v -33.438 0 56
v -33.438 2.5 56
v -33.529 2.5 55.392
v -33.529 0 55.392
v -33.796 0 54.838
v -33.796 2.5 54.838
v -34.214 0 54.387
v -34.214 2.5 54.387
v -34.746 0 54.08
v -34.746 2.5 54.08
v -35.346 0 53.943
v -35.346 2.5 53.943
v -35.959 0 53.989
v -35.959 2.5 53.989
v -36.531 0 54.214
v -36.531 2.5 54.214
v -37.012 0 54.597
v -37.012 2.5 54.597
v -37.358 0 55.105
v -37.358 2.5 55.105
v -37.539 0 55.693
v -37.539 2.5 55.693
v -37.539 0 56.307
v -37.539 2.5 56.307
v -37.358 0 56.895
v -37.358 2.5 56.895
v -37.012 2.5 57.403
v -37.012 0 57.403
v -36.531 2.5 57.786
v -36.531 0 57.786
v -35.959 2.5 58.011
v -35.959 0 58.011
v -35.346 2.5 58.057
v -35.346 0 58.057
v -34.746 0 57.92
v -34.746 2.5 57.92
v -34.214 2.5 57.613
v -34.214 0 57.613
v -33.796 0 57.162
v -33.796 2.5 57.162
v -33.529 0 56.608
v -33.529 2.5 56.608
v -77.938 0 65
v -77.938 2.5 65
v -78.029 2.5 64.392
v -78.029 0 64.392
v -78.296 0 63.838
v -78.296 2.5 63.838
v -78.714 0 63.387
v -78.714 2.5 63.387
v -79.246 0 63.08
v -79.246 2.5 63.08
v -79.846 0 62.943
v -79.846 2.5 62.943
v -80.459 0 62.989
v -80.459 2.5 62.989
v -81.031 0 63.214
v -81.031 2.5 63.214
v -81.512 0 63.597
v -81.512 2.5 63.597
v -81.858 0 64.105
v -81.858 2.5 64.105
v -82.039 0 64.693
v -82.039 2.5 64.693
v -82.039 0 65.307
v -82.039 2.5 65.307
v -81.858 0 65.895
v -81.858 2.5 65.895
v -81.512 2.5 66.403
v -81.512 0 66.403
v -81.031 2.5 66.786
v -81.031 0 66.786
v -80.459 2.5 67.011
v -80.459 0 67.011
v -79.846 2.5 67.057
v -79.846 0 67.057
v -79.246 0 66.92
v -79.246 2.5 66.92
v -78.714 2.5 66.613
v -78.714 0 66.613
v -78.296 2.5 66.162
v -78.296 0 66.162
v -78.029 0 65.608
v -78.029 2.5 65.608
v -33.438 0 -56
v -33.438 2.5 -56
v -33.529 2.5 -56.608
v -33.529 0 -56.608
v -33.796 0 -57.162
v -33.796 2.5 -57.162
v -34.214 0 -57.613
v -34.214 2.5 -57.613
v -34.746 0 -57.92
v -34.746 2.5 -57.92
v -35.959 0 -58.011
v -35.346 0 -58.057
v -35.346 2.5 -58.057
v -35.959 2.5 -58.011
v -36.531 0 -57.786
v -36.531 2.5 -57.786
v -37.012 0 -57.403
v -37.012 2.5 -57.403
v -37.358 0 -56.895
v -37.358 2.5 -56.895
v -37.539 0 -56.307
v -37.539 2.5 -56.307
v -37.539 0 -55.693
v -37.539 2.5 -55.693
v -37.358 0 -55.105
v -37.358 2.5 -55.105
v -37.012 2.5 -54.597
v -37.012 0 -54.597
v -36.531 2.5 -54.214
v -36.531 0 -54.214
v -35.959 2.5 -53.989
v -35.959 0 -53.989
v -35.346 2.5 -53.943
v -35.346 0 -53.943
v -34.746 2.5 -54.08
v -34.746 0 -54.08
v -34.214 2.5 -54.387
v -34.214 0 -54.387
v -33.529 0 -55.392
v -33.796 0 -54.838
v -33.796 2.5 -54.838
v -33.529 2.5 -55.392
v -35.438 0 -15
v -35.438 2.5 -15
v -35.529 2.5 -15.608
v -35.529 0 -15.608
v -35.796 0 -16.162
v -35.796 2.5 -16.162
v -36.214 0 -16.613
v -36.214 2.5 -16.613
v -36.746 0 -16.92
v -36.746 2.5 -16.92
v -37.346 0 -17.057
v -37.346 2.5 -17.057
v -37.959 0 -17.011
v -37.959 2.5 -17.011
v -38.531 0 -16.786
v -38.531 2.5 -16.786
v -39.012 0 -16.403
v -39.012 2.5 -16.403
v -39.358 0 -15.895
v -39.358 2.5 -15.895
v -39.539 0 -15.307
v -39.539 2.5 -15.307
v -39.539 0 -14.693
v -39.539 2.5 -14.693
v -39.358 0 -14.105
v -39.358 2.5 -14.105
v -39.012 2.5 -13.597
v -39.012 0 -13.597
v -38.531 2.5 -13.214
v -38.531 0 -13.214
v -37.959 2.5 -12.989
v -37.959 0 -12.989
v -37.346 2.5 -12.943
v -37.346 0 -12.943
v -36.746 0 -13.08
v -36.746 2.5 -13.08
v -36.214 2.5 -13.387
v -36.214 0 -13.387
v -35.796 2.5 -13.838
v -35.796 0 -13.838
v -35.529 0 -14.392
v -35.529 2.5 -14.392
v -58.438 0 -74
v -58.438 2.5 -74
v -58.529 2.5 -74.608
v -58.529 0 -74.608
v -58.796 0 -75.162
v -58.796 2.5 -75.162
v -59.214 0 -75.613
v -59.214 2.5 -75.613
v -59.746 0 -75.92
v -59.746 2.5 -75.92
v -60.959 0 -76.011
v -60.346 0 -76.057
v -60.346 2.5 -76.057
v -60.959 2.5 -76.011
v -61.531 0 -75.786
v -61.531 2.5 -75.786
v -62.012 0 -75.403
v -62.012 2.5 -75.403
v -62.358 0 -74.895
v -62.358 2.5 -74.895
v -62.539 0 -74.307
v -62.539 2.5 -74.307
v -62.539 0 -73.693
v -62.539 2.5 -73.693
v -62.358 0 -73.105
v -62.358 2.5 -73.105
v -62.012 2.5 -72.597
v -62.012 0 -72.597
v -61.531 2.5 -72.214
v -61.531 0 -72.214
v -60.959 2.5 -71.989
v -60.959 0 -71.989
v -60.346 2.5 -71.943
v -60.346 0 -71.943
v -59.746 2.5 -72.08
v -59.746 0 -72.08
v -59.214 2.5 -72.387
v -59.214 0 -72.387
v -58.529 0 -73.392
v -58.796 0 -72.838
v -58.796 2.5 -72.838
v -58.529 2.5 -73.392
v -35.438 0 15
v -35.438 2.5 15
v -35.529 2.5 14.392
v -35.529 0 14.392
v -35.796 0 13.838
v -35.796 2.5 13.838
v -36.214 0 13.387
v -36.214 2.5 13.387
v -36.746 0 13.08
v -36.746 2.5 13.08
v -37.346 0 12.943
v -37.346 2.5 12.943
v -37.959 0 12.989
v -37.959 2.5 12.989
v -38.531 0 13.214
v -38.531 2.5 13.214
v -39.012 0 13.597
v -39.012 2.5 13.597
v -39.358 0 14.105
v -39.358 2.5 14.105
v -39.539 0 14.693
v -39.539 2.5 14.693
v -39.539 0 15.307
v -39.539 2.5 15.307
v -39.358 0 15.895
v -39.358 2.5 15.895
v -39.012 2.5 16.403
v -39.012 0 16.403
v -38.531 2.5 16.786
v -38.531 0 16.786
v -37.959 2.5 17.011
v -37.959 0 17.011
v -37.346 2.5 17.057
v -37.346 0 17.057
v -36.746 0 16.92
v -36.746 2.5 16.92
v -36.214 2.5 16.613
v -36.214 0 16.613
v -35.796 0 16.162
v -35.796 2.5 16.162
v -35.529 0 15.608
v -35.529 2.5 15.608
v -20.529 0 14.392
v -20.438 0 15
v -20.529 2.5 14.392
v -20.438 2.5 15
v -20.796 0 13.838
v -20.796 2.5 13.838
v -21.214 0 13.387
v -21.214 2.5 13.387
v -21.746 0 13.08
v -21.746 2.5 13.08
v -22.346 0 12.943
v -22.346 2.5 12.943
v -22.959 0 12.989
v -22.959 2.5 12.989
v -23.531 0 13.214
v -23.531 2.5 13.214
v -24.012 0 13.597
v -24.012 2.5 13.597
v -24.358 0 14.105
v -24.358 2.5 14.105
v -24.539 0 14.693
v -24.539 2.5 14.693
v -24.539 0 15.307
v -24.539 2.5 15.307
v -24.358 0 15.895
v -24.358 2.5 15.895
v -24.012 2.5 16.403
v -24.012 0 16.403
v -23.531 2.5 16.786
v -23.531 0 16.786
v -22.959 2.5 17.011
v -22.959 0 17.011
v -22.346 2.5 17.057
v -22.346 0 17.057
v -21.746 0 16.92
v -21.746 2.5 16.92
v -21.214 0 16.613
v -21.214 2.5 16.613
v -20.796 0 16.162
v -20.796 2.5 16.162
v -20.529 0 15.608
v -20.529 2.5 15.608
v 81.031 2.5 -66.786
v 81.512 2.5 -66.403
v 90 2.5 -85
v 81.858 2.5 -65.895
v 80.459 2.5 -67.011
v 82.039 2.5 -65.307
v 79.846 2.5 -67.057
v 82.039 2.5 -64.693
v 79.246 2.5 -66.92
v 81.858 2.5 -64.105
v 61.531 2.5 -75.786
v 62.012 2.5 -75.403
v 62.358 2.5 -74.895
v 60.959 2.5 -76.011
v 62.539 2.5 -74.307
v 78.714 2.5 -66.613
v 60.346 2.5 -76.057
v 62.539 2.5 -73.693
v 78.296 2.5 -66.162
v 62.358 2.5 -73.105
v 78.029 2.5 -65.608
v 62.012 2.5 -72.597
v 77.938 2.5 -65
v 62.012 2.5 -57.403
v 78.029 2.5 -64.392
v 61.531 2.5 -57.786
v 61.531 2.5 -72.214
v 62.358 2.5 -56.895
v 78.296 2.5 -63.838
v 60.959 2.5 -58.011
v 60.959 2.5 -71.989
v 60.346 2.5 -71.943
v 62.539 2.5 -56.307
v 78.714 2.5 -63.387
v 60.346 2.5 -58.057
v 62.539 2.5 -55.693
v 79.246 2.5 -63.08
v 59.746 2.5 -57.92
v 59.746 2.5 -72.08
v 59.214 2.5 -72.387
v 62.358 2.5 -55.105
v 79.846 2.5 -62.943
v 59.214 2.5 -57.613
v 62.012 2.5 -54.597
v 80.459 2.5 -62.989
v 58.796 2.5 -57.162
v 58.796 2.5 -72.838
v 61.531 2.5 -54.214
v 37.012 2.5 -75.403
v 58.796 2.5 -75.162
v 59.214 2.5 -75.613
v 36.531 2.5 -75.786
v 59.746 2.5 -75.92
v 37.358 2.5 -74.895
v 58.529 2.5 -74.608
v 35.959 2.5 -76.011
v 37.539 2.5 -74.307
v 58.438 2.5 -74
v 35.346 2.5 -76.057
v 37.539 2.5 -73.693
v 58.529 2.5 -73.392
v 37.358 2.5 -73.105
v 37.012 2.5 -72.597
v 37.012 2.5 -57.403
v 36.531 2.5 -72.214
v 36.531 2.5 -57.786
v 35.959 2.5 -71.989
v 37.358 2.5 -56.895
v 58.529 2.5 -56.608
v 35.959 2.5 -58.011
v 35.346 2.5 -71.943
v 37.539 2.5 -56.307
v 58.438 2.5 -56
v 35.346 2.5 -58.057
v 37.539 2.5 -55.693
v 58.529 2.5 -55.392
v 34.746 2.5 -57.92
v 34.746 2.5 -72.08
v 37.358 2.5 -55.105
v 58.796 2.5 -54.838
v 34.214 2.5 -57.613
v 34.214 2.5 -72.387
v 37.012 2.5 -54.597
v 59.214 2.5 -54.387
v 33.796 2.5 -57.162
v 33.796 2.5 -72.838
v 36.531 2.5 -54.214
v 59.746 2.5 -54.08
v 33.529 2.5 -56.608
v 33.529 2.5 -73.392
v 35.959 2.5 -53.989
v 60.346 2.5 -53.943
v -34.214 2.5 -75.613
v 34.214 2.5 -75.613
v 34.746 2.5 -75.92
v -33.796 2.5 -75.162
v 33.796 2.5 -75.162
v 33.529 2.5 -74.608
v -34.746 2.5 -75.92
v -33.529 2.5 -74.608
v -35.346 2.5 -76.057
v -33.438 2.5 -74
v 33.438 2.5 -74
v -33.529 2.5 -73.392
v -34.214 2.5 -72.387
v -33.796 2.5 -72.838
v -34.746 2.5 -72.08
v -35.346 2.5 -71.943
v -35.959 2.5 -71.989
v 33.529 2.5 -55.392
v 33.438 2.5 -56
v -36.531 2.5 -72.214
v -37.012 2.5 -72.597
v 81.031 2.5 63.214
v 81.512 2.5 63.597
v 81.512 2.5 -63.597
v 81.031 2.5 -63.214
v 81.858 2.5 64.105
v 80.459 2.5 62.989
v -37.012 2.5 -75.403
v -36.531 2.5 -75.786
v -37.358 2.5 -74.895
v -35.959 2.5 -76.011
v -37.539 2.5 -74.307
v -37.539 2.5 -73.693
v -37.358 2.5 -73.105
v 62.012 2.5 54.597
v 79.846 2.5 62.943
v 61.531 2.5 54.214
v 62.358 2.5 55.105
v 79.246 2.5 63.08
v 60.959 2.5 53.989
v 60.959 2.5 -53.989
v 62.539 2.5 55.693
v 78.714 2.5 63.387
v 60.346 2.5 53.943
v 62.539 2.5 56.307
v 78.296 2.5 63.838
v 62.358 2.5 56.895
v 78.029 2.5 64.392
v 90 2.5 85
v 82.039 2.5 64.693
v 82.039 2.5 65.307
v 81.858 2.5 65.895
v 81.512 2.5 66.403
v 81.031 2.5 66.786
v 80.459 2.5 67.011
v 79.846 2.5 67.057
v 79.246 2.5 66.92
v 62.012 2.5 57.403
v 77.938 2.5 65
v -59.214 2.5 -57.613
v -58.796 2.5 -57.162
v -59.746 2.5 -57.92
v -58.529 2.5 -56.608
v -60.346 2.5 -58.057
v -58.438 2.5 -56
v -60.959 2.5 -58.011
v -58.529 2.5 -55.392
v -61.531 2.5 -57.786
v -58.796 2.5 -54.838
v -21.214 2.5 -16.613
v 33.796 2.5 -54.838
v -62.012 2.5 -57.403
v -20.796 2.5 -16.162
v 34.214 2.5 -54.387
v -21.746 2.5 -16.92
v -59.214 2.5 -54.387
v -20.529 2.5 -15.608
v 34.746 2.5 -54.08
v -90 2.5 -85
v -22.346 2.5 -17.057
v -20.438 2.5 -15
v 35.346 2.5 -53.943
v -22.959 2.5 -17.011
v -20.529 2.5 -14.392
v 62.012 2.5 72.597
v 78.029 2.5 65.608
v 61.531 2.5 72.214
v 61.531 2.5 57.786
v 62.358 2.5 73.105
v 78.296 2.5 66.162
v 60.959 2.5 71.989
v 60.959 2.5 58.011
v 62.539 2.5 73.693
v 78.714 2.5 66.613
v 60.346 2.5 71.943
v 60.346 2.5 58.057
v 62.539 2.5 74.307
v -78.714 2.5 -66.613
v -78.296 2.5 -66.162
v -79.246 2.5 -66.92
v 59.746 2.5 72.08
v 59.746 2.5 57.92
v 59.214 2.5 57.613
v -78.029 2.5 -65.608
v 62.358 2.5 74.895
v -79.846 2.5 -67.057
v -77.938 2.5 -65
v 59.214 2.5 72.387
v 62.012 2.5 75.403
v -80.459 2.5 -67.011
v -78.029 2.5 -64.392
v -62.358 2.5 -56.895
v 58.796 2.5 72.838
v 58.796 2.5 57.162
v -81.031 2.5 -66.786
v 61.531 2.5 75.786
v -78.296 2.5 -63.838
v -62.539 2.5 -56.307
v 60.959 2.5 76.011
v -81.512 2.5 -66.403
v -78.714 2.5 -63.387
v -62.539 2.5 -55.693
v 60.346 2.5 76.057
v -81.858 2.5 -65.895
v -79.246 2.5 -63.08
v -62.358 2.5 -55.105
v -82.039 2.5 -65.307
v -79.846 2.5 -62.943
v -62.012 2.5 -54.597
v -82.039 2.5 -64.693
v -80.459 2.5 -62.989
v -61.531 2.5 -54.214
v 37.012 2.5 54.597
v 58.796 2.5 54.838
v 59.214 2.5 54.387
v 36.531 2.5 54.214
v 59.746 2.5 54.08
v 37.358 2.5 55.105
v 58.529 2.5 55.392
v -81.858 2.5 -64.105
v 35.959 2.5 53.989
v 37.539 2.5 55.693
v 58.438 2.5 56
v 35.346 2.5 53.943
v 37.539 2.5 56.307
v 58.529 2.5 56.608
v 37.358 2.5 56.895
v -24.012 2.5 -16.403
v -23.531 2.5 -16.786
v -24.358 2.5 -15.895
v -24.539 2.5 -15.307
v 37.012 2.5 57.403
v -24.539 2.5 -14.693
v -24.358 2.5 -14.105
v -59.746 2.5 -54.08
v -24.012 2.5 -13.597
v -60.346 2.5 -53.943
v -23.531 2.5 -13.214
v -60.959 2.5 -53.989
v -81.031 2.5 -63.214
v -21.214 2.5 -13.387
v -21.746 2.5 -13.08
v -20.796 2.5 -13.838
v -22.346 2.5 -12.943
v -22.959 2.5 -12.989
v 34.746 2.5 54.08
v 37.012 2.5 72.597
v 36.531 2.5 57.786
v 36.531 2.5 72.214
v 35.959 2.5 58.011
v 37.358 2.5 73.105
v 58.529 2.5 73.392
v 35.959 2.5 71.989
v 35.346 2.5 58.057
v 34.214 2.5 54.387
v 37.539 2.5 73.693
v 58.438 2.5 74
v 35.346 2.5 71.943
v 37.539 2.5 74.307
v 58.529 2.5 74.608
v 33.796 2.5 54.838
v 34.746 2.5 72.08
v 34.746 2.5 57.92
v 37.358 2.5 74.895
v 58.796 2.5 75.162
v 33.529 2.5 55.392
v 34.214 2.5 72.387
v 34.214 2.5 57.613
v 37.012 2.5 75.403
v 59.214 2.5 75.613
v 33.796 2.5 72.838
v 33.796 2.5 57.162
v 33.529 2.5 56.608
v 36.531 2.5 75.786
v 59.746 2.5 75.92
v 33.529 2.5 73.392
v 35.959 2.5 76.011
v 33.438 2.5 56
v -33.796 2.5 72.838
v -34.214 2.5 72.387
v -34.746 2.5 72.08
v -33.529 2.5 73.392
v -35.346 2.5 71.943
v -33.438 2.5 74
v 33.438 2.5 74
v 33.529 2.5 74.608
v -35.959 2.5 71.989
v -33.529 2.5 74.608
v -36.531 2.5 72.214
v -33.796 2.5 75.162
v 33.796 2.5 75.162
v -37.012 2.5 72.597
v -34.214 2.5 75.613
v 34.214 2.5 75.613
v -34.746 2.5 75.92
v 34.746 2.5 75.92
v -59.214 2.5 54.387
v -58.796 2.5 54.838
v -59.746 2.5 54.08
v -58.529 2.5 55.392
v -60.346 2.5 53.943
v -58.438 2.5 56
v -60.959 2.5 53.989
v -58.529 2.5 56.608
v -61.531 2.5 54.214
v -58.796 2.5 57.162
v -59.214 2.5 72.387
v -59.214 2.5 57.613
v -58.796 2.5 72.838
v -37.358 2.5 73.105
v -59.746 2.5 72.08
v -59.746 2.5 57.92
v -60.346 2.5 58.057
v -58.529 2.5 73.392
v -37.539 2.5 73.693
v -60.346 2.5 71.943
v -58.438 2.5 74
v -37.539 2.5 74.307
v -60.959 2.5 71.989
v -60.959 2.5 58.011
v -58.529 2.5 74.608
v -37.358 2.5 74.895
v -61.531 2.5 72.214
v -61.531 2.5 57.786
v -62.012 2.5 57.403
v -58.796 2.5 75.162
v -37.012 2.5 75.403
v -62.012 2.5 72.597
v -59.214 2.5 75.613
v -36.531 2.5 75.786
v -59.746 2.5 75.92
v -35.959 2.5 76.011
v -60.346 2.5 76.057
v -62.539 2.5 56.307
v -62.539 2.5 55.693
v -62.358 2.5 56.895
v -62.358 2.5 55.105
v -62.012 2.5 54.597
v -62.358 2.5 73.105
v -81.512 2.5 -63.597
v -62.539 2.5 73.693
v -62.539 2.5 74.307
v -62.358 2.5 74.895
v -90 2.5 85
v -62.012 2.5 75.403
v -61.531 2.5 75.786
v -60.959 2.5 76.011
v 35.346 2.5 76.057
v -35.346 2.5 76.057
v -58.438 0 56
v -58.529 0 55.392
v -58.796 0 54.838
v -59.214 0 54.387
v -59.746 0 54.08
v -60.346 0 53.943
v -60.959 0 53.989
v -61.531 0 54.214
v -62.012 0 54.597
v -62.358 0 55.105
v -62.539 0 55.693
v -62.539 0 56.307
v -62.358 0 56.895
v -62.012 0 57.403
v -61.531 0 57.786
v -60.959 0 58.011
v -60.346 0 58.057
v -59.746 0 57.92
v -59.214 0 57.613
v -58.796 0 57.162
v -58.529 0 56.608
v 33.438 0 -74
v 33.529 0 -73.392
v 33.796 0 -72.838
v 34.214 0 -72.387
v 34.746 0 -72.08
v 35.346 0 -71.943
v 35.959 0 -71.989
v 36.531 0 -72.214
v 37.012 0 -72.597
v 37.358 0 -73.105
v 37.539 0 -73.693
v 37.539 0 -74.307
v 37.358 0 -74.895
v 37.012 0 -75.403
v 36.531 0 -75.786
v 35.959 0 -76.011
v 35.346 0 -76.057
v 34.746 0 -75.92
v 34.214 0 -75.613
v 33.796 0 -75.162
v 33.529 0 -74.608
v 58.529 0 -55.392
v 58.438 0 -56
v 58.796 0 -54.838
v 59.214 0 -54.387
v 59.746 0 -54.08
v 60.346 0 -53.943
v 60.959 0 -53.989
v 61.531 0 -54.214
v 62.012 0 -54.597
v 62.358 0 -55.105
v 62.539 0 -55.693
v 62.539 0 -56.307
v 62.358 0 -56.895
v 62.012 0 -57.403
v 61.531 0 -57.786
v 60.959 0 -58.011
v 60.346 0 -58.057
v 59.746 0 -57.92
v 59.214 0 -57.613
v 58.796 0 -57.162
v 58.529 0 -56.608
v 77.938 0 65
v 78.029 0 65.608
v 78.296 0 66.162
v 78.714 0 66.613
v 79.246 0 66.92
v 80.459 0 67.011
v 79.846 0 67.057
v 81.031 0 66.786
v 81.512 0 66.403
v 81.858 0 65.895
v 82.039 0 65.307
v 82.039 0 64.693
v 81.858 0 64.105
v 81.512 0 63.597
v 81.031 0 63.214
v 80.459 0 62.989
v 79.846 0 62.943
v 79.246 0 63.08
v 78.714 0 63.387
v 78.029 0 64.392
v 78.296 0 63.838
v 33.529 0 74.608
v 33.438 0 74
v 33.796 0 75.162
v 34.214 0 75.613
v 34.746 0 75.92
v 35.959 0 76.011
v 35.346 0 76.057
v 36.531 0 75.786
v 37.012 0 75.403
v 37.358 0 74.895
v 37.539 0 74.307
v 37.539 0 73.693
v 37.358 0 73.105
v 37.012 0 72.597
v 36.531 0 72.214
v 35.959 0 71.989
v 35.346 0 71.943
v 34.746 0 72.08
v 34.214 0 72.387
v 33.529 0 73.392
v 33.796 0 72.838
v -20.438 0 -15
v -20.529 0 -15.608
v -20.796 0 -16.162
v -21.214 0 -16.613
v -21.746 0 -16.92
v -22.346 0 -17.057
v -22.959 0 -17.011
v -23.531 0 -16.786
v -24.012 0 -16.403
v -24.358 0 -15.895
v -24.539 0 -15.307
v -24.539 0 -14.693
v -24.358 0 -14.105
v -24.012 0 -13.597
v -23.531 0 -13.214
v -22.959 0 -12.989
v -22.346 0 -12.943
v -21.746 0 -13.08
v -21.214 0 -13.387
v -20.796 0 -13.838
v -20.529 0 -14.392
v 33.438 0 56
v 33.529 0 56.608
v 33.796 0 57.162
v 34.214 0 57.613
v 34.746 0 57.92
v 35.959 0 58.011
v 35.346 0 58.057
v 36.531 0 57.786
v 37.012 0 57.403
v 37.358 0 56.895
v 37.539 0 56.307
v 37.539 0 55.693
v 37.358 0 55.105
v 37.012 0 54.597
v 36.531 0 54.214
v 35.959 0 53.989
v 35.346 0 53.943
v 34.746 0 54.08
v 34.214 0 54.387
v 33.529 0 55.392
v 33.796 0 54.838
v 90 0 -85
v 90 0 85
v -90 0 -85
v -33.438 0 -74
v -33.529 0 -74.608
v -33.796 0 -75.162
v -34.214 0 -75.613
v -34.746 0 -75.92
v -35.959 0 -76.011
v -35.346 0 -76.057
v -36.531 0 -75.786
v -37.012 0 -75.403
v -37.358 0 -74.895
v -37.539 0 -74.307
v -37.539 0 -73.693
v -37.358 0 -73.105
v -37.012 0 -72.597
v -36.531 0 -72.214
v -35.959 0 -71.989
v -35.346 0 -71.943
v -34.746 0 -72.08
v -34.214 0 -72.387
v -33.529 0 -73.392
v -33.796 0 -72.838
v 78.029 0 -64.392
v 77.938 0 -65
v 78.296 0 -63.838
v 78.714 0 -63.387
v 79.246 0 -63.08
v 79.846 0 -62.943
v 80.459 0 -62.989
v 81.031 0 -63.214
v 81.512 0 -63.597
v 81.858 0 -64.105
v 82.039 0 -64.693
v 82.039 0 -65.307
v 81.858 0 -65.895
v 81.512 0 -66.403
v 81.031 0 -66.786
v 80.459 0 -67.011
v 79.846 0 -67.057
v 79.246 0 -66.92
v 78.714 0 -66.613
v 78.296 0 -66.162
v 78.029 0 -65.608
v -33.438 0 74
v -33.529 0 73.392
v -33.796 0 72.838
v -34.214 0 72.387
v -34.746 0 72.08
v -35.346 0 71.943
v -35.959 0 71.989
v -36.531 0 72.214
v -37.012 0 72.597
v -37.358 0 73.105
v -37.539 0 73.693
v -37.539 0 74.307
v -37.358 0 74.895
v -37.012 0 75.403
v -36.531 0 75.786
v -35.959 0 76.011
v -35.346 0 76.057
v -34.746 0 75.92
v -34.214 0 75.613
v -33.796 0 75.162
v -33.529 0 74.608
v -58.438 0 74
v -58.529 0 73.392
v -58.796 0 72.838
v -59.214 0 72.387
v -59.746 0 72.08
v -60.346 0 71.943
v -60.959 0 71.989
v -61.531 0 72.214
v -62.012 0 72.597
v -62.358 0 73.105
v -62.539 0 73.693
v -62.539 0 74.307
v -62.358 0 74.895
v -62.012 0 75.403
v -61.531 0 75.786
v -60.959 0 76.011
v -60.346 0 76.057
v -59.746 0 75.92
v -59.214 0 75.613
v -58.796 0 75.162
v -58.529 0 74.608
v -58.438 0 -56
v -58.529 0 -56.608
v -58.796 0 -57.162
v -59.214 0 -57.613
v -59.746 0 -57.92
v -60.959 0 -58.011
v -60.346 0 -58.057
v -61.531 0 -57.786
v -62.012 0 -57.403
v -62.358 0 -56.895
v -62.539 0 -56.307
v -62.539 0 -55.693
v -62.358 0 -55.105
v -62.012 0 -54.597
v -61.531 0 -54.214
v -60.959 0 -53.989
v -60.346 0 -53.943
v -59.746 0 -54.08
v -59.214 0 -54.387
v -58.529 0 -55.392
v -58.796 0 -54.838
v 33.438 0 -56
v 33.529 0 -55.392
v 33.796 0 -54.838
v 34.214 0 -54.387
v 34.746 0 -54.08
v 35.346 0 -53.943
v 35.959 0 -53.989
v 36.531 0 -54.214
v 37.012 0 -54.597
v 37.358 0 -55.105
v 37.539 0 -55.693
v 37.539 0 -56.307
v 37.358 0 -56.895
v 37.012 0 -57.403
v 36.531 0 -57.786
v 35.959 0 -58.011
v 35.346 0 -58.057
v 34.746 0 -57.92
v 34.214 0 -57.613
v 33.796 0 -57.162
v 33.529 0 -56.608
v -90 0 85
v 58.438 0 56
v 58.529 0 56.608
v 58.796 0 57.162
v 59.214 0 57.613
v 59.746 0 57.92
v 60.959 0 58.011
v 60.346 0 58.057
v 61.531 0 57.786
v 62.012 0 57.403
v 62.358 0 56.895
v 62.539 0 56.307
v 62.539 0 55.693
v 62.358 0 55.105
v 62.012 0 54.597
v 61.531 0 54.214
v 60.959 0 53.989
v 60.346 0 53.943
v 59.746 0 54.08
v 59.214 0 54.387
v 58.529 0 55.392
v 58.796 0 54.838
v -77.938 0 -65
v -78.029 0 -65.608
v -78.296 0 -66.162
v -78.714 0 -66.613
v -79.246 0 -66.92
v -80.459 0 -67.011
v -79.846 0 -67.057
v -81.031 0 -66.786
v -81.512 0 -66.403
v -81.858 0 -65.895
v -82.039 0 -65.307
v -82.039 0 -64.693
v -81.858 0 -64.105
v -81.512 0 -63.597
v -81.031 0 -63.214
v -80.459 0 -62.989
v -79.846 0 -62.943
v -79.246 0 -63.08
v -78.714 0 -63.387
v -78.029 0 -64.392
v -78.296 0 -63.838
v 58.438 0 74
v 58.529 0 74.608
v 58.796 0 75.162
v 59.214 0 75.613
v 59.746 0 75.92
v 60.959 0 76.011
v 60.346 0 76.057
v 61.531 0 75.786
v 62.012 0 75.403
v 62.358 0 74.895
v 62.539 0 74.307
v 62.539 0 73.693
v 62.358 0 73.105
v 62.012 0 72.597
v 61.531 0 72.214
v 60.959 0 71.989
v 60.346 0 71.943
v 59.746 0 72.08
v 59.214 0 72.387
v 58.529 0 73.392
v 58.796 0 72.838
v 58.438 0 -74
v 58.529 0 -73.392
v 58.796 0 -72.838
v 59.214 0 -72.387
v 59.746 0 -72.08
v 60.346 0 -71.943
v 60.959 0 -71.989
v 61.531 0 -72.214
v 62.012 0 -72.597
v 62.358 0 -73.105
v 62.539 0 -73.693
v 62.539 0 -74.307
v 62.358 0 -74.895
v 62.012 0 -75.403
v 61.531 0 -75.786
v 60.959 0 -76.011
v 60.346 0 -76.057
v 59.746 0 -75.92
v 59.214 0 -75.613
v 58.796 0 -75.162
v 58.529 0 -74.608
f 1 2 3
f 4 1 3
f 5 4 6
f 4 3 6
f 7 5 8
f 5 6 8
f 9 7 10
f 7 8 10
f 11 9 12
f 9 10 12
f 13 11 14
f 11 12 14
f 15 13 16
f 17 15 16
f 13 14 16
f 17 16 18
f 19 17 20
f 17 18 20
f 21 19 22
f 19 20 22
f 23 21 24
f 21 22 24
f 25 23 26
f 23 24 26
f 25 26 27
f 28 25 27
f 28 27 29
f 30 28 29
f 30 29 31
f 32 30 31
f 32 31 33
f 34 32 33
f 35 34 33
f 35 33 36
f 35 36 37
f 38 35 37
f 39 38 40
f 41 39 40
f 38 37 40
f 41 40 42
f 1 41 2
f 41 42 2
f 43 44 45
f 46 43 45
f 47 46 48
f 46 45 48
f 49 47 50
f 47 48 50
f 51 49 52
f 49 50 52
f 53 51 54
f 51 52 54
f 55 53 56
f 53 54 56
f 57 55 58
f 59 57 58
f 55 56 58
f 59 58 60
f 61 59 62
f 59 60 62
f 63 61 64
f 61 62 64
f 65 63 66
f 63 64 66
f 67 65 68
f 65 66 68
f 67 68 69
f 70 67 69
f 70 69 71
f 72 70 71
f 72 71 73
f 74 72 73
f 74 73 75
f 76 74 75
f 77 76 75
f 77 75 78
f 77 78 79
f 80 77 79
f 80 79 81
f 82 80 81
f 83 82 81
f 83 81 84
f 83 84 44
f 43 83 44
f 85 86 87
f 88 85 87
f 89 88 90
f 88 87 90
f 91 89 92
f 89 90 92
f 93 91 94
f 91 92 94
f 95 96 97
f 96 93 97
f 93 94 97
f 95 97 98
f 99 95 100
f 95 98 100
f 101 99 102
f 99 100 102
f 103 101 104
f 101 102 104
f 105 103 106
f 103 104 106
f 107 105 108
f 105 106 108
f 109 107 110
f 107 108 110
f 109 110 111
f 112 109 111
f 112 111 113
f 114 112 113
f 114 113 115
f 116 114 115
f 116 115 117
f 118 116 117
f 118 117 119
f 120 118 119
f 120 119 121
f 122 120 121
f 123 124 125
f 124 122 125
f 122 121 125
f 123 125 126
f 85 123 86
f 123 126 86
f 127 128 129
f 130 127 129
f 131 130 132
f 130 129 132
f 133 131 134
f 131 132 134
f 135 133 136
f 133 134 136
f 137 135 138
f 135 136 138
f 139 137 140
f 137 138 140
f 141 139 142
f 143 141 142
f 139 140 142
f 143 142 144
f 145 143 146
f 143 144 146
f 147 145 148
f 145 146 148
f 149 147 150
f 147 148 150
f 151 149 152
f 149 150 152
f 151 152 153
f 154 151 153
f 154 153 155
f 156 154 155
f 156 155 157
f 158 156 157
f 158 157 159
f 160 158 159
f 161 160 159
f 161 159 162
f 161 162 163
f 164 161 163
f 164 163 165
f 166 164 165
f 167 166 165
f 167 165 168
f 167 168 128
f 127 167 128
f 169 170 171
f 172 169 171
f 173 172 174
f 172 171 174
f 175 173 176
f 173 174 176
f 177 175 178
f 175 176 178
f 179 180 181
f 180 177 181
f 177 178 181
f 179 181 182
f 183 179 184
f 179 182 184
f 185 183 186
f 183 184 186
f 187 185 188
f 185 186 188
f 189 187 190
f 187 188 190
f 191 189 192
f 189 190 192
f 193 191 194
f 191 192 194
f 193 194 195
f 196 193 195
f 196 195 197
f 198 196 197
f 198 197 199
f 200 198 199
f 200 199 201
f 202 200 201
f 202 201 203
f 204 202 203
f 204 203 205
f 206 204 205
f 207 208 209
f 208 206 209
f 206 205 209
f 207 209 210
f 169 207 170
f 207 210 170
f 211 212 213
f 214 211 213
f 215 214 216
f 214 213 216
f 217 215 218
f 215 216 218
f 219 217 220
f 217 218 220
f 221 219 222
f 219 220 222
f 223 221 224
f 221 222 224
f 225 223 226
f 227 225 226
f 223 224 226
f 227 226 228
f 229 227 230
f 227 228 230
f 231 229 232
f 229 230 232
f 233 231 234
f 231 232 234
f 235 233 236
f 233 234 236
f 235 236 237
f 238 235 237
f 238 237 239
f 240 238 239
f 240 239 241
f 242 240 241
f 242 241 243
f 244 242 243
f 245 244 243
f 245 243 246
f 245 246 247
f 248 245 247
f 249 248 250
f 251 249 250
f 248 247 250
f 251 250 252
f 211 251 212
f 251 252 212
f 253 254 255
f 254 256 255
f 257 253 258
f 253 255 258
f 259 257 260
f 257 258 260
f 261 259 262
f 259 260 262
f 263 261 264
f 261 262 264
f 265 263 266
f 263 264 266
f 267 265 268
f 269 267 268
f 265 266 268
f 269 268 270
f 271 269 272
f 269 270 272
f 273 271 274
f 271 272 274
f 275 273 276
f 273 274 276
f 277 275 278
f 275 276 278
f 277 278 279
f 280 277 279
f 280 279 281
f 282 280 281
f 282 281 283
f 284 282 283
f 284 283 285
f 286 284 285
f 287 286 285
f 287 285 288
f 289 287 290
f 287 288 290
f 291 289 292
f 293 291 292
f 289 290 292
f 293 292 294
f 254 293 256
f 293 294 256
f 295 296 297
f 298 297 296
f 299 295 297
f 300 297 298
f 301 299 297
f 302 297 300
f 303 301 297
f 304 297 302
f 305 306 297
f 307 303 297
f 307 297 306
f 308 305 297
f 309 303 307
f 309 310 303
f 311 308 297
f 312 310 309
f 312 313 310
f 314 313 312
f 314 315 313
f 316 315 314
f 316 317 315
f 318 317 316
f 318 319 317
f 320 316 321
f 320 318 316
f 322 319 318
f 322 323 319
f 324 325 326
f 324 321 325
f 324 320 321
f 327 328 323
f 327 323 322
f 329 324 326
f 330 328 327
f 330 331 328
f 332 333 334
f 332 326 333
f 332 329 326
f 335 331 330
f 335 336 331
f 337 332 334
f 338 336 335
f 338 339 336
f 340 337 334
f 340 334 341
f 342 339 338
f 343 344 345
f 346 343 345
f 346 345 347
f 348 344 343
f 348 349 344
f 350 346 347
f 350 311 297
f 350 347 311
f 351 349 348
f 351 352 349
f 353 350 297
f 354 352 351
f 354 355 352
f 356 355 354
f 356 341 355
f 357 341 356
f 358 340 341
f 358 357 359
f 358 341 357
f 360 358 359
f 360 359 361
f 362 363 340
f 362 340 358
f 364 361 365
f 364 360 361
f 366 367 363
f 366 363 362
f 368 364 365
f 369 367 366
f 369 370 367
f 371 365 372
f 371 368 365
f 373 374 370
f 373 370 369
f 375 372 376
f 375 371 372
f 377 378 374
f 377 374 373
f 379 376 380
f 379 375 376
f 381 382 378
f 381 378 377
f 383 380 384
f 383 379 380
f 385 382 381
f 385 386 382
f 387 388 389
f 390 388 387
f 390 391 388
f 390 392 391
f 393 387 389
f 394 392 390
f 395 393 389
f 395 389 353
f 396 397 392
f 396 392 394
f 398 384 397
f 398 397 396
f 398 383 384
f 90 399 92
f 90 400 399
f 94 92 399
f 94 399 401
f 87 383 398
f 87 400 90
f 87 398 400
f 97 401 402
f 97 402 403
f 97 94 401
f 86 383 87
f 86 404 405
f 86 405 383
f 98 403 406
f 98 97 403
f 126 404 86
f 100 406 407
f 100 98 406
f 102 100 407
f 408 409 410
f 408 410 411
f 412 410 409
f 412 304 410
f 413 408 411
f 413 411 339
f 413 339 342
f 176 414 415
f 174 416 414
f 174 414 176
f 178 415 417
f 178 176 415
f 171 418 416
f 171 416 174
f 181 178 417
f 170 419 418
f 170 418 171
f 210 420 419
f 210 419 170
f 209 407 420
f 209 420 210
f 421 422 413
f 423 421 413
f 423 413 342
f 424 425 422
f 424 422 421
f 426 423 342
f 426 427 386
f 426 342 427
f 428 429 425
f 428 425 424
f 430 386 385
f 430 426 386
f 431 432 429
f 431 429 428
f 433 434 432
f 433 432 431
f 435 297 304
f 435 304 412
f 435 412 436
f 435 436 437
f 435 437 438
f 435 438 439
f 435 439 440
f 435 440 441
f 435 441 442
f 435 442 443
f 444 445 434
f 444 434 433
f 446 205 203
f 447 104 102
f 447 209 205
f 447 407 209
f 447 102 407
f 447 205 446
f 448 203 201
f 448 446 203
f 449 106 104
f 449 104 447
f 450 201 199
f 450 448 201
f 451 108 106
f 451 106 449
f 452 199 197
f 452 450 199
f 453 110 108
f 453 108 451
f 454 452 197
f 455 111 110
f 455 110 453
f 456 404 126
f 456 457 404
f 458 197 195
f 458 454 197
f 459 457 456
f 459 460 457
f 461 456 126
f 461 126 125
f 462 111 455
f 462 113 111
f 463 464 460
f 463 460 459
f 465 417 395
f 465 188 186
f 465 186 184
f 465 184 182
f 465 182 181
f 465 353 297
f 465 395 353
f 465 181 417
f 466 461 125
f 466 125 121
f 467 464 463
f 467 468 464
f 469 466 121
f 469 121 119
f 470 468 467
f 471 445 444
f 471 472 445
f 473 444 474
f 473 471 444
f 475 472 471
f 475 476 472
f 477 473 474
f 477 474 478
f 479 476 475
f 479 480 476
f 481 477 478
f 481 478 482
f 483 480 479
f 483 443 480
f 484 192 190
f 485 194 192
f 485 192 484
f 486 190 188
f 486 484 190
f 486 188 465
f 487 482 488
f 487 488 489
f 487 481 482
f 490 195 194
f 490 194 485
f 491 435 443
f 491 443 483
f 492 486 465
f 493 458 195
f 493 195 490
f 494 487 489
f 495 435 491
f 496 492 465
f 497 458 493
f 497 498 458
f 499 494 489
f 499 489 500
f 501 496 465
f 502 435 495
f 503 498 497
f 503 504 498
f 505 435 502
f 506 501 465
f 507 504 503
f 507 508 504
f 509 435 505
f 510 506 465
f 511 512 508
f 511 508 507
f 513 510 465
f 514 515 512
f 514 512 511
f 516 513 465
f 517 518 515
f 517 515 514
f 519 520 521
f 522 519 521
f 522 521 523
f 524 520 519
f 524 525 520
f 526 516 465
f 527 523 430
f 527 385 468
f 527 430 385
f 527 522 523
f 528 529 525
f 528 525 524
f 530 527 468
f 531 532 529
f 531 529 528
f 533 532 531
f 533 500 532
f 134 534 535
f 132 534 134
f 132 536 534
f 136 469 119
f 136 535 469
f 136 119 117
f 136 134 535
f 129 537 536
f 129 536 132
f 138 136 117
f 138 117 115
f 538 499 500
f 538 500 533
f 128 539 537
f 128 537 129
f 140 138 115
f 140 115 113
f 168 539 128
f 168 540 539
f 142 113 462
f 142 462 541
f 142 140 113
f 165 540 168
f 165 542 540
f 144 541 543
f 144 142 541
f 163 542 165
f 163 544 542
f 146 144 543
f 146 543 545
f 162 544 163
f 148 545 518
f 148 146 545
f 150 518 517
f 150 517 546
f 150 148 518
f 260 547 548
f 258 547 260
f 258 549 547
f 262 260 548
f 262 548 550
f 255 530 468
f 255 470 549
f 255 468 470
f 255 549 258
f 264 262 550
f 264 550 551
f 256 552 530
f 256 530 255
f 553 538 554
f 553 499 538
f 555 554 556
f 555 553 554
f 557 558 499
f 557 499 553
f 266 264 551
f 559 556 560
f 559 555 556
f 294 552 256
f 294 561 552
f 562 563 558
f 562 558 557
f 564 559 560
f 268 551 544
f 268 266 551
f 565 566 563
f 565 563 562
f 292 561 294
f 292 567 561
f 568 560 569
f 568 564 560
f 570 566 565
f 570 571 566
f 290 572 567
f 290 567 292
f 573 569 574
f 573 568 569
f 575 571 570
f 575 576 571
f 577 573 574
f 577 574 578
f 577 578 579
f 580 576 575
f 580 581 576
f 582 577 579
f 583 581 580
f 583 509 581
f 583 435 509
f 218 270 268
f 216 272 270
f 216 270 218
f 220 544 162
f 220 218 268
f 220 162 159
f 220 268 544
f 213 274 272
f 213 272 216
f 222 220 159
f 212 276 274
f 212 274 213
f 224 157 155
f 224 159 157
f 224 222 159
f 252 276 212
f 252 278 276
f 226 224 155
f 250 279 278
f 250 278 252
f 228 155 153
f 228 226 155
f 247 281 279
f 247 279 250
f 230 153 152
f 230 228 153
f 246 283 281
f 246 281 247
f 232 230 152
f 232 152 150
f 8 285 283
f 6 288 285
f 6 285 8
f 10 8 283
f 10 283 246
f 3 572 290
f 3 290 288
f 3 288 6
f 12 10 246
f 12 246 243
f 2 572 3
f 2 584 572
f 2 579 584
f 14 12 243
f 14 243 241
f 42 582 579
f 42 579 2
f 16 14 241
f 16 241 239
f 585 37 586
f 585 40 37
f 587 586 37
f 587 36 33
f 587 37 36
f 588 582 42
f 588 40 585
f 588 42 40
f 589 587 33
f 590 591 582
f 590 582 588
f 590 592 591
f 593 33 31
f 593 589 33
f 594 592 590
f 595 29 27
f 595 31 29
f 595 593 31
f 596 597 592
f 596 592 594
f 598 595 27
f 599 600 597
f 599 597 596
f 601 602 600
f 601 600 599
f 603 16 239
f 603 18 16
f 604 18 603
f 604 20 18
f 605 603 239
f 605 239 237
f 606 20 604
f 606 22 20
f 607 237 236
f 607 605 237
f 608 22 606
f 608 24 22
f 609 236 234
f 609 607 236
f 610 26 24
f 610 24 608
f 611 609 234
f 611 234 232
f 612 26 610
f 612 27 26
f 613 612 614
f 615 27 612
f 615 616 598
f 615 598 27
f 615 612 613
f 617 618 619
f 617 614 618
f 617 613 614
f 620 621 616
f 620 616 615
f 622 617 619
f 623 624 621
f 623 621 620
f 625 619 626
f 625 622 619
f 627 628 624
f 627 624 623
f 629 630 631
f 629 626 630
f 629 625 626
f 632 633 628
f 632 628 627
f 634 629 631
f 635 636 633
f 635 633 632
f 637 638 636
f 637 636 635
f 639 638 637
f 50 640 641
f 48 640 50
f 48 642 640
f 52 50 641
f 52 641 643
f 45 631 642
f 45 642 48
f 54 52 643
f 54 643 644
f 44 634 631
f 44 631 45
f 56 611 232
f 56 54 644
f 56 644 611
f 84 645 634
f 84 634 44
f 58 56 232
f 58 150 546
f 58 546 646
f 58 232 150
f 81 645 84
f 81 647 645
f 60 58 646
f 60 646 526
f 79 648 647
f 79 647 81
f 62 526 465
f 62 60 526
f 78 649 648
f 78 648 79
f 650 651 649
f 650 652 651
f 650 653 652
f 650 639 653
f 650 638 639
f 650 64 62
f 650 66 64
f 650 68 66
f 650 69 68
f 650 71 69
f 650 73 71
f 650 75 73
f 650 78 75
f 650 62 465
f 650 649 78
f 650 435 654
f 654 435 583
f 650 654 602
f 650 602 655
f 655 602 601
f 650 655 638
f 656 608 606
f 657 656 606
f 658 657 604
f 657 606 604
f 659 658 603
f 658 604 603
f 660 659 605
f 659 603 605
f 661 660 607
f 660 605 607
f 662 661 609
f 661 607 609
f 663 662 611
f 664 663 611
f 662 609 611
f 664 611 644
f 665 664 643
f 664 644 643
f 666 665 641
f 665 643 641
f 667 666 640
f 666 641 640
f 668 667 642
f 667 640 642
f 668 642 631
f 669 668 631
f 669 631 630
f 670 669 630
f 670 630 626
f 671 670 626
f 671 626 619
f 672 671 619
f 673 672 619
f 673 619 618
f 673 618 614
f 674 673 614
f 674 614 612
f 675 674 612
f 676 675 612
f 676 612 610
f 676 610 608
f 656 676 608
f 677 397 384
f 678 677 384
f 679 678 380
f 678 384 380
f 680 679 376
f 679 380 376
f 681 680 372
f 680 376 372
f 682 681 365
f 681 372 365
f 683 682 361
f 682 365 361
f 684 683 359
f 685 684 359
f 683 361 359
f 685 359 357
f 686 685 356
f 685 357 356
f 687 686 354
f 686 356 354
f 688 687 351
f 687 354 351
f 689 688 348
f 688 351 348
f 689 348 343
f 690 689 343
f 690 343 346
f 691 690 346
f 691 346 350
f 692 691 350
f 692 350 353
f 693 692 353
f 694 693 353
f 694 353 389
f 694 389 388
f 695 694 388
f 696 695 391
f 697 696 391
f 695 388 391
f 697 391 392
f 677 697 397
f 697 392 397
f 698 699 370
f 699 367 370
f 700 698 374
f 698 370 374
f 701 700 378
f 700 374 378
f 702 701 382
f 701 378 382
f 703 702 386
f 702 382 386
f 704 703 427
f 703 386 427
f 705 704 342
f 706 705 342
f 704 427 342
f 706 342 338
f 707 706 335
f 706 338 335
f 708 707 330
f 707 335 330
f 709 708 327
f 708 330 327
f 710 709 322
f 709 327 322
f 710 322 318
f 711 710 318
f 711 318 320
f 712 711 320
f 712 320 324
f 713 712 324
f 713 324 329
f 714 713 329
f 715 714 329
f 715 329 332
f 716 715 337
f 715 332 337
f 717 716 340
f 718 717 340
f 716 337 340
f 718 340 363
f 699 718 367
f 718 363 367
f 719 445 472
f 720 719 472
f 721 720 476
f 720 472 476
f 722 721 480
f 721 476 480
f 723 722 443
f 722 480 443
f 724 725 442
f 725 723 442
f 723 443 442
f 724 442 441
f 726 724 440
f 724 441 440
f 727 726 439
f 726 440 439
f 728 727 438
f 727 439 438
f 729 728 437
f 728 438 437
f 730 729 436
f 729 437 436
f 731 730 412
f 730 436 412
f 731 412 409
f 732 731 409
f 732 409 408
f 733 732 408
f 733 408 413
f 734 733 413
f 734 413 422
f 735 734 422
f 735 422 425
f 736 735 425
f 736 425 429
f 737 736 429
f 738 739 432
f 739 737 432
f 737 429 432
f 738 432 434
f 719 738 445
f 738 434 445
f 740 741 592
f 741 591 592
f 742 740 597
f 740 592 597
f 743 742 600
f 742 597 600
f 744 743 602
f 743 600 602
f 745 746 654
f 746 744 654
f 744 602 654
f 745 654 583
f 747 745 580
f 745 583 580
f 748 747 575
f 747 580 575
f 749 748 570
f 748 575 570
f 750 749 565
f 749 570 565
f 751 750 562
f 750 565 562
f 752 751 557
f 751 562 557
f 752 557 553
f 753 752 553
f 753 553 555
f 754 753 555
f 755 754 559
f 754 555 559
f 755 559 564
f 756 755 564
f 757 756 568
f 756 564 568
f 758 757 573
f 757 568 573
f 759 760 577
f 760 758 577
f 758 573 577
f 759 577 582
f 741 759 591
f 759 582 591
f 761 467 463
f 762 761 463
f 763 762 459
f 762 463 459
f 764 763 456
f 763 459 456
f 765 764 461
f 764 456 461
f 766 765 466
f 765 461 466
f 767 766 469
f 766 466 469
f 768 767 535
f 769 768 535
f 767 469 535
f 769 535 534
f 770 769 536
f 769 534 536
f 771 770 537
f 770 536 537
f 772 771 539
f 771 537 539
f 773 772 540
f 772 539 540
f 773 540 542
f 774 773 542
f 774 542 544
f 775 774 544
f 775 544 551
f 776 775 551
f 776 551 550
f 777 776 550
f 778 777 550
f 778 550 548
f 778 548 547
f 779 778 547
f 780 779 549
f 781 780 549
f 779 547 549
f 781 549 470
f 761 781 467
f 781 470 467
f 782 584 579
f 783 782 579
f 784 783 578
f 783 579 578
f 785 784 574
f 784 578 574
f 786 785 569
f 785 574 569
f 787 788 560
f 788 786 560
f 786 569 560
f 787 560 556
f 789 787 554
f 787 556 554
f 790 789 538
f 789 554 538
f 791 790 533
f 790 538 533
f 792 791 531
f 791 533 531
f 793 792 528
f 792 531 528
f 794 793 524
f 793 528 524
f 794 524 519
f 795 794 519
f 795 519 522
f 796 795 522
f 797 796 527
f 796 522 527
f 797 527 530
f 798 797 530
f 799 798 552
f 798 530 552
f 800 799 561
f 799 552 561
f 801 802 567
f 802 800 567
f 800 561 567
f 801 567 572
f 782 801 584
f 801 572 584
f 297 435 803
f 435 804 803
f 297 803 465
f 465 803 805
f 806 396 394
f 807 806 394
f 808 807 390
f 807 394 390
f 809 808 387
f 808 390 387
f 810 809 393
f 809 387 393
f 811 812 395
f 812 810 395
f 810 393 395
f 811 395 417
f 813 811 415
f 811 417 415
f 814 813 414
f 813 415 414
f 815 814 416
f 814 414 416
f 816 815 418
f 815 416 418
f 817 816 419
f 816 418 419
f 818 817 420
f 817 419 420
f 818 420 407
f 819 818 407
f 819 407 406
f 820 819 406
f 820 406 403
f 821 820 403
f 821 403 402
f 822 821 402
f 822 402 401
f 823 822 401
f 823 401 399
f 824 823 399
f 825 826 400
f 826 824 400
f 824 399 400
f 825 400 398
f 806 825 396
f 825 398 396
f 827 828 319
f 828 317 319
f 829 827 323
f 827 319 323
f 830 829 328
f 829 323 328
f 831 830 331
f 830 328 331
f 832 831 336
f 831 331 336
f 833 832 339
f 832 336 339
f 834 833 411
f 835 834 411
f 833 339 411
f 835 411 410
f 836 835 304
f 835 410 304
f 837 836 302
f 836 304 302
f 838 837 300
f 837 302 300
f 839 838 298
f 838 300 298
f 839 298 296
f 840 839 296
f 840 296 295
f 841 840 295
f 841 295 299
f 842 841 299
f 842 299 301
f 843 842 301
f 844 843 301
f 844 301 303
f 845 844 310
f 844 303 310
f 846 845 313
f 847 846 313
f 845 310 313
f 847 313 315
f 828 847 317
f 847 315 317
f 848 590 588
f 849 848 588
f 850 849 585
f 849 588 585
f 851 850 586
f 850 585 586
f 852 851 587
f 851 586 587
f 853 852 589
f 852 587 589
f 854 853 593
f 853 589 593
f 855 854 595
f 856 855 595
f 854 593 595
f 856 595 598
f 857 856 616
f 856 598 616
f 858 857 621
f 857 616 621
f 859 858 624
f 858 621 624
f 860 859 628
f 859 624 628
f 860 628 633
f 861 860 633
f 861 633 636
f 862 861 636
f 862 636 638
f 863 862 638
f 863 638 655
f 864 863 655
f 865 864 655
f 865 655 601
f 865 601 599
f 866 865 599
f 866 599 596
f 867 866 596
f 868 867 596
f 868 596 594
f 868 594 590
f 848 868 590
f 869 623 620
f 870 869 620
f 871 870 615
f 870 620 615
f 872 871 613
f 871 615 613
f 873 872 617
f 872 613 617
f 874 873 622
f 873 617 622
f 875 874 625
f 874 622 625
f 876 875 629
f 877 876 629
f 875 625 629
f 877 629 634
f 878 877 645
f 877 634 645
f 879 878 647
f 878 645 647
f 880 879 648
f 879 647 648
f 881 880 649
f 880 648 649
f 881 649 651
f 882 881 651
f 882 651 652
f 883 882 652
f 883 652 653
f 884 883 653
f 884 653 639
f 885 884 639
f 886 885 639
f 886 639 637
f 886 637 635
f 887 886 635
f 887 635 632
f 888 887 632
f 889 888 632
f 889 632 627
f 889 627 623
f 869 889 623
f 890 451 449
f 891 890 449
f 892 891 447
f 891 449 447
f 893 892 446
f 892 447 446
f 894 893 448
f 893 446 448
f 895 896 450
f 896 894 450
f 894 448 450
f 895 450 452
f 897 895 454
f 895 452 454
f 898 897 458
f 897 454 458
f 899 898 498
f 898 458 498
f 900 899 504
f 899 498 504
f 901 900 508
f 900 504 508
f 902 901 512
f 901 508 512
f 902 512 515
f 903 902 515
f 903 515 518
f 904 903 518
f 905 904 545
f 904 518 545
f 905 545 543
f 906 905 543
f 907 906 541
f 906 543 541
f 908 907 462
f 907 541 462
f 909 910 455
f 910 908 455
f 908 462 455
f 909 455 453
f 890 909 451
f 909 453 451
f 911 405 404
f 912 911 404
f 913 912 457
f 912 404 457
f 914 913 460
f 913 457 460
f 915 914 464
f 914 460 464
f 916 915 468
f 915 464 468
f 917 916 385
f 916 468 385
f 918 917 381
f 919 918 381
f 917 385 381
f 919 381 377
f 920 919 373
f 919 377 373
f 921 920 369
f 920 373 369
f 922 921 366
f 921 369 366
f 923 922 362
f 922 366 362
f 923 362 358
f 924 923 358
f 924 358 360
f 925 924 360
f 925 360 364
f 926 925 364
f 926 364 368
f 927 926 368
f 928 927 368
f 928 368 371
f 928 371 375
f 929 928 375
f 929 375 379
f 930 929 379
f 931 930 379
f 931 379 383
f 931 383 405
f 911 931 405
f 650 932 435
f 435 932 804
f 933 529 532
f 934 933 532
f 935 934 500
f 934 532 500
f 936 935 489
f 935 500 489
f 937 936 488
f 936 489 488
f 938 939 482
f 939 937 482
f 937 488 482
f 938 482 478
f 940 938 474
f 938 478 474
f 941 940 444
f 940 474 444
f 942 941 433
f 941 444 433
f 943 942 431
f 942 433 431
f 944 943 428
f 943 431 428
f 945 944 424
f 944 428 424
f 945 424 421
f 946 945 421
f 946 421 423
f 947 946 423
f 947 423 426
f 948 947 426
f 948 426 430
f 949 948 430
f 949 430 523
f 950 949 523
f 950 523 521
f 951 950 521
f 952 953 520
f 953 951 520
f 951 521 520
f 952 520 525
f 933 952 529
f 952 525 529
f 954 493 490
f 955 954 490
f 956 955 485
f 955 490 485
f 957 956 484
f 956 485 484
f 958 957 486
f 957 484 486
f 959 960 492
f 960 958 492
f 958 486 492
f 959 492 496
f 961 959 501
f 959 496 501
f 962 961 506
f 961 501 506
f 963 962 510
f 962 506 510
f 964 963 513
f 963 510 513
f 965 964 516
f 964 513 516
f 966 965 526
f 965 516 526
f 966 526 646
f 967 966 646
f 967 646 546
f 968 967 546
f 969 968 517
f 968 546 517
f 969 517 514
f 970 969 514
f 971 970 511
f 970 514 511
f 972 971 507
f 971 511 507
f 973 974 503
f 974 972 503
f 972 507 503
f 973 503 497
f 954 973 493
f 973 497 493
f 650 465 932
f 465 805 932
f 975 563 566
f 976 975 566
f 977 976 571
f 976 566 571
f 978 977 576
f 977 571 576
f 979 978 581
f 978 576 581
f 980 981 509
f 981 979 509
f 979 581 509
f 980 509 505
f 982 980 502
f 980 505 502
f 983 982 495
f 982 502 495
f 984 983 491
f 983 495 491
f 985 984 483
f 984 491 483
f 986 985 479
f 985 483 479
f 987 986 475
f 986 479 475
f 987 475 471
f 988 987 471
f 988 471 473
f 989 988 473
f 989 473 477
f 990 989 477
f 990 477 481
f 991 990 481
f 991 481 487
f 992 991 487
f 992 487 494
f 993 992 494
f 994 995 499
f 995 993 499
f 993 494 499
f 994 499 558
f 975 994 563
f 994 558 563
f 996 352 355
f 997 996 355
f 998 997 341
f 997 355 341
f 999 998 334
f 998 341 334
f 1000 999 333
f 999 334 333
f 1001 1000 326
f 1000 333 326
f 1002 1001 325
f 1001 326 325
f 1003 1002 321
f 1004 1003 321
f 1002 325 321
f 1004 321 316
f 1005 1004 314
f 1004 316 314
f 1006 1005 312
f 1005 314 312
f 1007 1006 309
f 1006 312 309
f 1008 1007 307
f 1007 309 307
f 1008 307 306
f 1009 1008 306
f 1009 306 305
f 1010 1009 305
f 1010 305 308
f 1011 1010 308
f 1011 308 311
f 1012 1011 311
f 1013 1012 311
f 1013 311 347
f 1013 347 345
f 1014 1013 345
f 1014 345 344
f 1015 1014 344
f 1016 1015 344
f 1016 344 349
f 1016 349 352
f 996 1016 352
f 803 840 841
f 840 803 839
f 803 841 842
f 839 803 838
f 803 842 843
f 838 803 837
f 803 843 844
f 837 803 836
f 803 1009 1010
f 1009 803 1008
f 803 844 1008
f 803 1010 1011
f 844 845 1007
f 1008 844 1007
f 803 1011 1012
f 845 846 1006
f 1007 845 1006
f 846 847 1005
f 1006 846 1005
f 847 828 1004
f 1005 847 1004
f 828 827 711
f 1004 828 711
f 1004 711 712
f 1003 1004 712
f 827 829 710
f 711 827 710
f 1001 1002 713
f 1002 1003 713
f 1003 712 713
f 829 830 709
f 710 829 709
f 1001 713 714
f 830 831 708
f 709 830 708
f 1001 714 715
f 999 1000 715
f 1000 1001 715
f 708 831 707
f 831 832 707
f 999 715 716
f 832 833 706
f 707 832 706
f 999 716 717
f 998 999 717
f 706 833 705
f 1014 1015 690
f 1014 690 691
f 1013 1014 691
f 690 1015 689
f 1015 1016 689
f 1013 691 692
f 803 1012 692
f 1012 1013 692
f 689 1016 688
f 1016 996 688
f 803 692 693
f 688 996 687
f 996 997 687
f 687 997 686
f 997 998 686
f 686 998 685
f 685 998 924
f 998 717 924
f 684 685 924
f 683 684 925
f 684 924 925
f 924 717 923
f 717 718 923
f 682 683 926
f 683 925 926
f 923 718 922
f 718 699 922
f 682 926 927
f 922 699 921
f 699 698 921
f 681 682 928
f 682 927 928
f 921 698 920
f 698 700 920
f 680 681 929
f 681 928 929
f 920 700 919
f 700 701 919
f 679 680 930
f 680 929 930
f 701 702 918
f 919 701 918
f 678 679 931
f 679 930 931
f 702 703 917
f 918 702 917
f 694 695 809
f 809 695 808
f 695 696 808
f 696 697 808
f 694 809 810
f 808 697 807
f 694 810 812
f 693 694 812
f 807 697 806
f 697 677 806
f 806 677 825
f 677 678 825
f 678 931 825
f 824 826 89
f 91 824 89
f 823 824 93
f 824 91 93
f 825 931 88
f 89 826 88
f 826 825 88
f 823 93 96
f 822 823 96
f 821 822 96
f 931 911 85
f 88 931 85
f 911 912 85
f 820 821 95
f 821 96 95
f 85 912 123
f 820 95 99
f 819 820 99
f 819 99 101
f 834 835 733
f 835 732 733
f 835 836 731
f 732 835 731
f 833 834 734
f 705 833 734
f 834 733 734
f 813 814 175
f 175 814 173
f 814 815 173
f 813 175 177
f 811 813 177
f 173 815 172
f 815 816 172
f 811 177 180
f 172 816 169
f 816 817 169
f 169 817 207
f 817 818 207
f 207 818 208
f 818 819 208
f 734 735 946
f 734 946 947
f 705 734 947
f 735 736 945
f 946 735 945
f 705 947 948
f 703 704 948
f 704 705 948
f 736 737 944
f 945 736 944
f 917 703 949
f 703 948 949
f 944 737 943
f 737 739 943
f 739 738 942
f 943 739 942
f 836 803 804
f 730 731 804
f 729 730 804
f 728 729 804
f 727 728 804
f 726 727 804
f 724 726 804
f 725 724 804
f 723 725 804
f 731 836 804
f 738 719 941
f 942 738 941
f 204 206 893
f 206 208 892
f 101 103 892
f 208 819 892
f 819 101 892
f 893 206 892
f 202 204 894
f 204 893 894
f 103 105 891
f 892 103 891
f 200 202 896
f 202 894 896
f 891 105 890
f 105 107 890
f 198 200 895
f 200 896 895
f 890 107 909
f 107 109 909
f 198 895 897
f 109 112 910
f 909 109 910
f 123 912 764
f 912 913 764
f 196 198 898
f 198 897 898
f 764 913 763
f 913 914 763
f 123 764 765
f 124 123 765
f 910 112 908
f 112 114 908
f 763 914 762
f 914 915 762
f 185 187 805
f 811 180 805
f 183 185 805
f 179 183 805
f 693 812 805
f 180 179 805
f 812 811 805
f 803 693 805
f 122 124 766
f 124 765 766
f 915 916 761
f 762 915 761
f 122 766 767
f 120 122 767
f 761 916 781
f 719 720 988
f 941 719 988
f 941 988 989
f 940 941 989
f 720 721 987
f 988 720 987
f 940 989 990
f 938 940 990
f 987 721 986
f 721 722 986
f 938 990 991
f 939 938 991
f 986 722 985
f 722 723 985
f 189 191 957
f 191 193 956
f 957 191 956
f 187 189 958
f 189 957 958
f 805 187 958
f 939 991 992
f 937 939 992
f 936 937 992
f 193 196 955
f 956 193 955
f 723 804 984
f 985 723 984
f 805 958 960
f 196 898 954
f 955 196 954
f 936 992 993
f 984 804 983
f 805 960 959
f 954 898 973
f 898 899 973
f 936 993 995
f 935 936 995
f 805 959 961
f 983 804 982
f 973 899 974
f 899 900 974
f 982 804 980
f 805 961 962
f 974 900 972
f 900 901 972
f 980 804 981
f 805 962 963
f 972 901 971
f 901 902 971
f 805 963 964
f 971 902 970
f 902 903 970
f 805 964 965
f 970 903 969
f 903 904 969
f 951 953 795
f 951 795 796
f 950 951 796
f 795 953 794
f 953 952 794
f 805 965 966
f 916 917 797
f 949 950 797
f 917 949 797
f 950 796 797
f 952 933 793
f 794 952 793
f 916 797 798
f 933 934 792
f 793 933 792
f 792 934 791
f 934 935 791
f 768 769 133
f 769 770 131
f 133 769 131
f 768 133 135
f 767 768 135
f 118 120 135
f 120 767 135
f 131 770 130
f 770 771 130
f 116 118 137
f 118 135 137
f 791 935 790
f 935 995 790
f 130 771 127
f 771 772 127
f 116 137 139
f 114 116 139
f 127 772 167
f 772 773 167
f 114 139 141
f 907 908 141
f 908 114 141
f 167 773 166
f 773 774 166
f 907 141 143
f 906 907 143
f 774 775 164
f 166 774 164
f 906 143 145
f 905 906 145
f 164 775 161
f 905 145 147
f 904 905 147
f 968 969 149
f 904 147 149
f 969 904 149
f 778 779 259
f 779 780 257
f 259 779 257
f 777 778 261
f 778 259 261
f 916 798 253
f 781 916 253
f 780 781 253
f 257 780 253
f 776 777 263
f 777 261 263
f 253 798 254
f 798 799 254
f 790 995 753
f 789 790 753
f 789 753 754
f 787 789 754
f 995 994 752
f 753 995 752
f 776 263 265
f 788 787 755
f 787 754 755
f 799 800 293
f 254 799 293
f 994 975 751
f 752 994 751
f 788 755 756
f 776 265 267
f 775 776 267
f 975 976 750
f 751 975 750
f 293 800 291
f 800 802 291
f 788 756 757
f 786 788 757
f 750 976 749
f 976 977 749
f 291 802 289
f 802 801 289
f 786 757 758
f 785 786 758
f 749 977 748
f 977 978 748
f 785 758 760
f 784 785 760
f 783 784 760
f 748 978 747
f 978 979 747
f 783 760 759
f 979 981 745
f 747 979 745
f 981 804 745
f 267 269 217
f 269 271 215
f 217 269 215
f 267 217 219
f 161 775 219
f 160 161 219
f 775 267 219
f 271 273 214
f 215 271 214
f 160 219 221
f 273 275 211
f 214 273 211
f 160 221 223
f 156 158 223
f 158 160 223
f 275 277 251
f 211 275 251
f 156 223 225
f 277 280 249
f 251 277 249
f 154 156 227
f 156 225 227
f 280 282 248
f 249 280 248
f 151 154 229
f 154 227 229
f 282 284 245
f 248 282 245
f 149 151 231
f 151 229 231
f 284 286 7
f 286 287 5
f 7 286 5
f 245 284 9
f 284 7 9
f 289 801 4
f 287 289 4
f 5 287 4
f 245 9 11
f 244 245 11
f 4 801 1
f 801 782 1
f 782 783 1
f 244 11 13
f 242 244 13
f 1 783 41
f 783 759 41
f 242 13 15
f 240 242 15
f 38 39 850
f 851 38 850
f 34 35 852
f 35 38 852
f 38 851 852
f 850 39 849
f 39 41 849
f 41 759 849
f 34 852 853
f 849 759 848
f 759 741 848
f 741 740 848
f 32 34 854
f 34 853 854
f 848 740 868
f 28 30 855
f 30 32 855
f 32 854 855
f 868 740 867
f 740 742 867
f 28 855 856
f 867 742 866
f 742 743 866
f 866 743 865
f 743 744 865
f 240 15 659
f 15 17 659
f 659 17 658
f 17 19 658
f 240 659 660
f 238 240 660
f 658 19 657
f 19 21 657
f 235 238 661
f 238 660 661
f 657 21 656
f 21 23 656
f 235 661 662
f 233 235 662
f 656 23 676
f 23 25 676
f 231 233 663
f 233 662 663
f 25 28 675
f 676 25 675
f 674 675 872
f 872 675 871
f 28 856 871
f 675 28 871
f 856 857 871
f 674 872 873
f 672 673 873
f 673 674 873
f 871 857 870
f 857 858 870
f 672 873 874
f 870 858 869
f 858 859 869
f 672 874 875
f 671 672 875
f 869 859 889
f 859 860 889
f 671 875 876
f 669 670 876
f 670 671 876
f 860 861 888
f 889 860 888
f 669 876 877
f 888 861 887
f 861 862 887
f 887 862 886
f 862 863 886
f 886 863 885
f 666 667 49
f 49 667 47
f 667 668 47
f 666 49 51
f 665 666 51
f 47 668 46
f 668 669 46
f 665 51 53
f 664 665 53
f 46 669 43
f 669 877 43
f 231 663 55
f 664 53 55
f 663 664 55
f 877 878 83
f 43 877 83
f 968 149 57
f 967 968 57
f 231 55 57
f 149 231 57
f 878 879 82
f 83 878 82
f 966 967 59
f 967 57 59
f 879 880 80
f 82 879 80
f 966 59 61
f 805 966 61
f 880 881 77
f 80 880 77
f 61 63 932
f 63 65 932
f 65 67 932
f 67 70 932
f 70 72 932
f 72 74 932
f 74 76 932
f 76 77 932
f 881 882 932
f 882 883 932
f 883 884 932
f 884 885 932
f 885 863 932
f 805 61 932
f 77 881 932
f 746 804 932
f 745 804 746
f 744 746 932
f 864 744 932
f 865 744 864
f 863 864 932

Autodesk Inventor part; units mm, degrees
ref_plane "YZ Plane" through (0, 0, 0) normal (1, 0, 0) x (0, 1, 0)
ref_plane "XZ Plane" through (0, 0, 0) normal (0, 1, 0) x (-1, 0, 0)
ref_plane "XY Plane" through (0, 0, 0) normal (0, 0, 1) x (1, 0, 0)
sketch "Sketch1" plane through (0, 0, 0) normal (0, 1, 0) x (-1, 0, 0)
  line L0 (90, 85) -> (-90, 85)
  line L1 (-90, 85) -> (-90, -85)
  line L2 (-90, -85) -> (90, -85)
  line L3 (90, -85) -> (90, 85)
  line L4 (0, -119) -> (0, 119) projected
  line L5 (-126, 0) -> (126, 0) projected
  point P0 (0, 0)
  dimension "Length" = 170
  dimension "Width" = 180
extrude "Extrusion1" add sketch "Sketch1" along normal blind 2.5
sketch "Sketch2" plane through (0, 2.5, 0) normal (0, 1, 0) x (1, 0, 0)
  circle A0 centre (-60.5, -74) radius 2.0625
  circle A1 centre (-60.5, -56) radius 2.0625
  circle A2 centre (-35.5, -74) radius 2.0625
  circle A3 centre (-35.5, -56) radius 2.0625
  line L0 (-60.5, -74) -> (-60.5, -56) construction
  line L1 (-60.5, -56) -> (-35.5, -56) construction
  line L2 (-35.5, -56) -> (-35.5, -74) construction
  line L3 (-35.5, -74) -> (-60.5, -74) construction
  line L4 (-90, 85) -> (-90, -85) construction
  line L5 (-90, -85) -> (90, -85) construction
  circle A4 centre (-80, -65) radius 2.0625
  point P0 (0, 0)
  dimension "d4" = 4.125
  dimension "d5" = 18
  dimension "d6" = 25
  dimension "d7" = 29.5
  dimension "d8" = 11
  dimension "d9" = 4.125
  dimension "d10" = 10
  dimension "d11" = 20
extrude "Extrusion2" cut sketch "Sketch2" against normal up to next
mirror "Mirror1" about plane through (0, 0, 0) normal (0, 0, 1) of "Extrusion2"
mirror "Mirror2" about plane through (0, 0, 0) normal (1, 0, 0) of "Extrusion2", "Mirror1"
sketch "Sketch3" plane through (0, 2.5, 0) normal (0, 1, 0) x (1, 0, 0)
  circle A0 centre (-37.5, -15) radius 2.0625
  circle A1 centre (-37.5, 15) radius 2.0625
  circle A2 centre (-22.5, -15) radius 2.0625
  circle A3 centre (-22.5, 15) radius 2.0625
  line L0 (-22.5, 15) -> (-37.5, 15) construction
  line L1 (-37.5, 15) -> (-37.5, -15) construction
  line L2 (-37.5, -15) -> (-22.5, -15) construction
  line L3 (-22.5, -15) -> (-22.5, 15) construction
  line L4 (-22.5, 15) -> (-37.5, -15) construction
  line L5 (-37.5, 15) -> (-22.5, -15) construction
  line L6 (-90, 85) -> (-90, -85) construction
  line L7 (144.445, 0) -> (-144.445, 0) construction
  point P0 (0, 0)
  point P1 (-30, 0)
  point P2 (-30, 0)
  dimension "d14" = 30
  dimension "d15" = 4.125
  dimension "d16" = 15
  dimension "d17" = 60
extrude "Extrusion3" cut sketch "Sketch3" against normal up to next
properties part number "Base Plate" material "Aluminum 6061"
